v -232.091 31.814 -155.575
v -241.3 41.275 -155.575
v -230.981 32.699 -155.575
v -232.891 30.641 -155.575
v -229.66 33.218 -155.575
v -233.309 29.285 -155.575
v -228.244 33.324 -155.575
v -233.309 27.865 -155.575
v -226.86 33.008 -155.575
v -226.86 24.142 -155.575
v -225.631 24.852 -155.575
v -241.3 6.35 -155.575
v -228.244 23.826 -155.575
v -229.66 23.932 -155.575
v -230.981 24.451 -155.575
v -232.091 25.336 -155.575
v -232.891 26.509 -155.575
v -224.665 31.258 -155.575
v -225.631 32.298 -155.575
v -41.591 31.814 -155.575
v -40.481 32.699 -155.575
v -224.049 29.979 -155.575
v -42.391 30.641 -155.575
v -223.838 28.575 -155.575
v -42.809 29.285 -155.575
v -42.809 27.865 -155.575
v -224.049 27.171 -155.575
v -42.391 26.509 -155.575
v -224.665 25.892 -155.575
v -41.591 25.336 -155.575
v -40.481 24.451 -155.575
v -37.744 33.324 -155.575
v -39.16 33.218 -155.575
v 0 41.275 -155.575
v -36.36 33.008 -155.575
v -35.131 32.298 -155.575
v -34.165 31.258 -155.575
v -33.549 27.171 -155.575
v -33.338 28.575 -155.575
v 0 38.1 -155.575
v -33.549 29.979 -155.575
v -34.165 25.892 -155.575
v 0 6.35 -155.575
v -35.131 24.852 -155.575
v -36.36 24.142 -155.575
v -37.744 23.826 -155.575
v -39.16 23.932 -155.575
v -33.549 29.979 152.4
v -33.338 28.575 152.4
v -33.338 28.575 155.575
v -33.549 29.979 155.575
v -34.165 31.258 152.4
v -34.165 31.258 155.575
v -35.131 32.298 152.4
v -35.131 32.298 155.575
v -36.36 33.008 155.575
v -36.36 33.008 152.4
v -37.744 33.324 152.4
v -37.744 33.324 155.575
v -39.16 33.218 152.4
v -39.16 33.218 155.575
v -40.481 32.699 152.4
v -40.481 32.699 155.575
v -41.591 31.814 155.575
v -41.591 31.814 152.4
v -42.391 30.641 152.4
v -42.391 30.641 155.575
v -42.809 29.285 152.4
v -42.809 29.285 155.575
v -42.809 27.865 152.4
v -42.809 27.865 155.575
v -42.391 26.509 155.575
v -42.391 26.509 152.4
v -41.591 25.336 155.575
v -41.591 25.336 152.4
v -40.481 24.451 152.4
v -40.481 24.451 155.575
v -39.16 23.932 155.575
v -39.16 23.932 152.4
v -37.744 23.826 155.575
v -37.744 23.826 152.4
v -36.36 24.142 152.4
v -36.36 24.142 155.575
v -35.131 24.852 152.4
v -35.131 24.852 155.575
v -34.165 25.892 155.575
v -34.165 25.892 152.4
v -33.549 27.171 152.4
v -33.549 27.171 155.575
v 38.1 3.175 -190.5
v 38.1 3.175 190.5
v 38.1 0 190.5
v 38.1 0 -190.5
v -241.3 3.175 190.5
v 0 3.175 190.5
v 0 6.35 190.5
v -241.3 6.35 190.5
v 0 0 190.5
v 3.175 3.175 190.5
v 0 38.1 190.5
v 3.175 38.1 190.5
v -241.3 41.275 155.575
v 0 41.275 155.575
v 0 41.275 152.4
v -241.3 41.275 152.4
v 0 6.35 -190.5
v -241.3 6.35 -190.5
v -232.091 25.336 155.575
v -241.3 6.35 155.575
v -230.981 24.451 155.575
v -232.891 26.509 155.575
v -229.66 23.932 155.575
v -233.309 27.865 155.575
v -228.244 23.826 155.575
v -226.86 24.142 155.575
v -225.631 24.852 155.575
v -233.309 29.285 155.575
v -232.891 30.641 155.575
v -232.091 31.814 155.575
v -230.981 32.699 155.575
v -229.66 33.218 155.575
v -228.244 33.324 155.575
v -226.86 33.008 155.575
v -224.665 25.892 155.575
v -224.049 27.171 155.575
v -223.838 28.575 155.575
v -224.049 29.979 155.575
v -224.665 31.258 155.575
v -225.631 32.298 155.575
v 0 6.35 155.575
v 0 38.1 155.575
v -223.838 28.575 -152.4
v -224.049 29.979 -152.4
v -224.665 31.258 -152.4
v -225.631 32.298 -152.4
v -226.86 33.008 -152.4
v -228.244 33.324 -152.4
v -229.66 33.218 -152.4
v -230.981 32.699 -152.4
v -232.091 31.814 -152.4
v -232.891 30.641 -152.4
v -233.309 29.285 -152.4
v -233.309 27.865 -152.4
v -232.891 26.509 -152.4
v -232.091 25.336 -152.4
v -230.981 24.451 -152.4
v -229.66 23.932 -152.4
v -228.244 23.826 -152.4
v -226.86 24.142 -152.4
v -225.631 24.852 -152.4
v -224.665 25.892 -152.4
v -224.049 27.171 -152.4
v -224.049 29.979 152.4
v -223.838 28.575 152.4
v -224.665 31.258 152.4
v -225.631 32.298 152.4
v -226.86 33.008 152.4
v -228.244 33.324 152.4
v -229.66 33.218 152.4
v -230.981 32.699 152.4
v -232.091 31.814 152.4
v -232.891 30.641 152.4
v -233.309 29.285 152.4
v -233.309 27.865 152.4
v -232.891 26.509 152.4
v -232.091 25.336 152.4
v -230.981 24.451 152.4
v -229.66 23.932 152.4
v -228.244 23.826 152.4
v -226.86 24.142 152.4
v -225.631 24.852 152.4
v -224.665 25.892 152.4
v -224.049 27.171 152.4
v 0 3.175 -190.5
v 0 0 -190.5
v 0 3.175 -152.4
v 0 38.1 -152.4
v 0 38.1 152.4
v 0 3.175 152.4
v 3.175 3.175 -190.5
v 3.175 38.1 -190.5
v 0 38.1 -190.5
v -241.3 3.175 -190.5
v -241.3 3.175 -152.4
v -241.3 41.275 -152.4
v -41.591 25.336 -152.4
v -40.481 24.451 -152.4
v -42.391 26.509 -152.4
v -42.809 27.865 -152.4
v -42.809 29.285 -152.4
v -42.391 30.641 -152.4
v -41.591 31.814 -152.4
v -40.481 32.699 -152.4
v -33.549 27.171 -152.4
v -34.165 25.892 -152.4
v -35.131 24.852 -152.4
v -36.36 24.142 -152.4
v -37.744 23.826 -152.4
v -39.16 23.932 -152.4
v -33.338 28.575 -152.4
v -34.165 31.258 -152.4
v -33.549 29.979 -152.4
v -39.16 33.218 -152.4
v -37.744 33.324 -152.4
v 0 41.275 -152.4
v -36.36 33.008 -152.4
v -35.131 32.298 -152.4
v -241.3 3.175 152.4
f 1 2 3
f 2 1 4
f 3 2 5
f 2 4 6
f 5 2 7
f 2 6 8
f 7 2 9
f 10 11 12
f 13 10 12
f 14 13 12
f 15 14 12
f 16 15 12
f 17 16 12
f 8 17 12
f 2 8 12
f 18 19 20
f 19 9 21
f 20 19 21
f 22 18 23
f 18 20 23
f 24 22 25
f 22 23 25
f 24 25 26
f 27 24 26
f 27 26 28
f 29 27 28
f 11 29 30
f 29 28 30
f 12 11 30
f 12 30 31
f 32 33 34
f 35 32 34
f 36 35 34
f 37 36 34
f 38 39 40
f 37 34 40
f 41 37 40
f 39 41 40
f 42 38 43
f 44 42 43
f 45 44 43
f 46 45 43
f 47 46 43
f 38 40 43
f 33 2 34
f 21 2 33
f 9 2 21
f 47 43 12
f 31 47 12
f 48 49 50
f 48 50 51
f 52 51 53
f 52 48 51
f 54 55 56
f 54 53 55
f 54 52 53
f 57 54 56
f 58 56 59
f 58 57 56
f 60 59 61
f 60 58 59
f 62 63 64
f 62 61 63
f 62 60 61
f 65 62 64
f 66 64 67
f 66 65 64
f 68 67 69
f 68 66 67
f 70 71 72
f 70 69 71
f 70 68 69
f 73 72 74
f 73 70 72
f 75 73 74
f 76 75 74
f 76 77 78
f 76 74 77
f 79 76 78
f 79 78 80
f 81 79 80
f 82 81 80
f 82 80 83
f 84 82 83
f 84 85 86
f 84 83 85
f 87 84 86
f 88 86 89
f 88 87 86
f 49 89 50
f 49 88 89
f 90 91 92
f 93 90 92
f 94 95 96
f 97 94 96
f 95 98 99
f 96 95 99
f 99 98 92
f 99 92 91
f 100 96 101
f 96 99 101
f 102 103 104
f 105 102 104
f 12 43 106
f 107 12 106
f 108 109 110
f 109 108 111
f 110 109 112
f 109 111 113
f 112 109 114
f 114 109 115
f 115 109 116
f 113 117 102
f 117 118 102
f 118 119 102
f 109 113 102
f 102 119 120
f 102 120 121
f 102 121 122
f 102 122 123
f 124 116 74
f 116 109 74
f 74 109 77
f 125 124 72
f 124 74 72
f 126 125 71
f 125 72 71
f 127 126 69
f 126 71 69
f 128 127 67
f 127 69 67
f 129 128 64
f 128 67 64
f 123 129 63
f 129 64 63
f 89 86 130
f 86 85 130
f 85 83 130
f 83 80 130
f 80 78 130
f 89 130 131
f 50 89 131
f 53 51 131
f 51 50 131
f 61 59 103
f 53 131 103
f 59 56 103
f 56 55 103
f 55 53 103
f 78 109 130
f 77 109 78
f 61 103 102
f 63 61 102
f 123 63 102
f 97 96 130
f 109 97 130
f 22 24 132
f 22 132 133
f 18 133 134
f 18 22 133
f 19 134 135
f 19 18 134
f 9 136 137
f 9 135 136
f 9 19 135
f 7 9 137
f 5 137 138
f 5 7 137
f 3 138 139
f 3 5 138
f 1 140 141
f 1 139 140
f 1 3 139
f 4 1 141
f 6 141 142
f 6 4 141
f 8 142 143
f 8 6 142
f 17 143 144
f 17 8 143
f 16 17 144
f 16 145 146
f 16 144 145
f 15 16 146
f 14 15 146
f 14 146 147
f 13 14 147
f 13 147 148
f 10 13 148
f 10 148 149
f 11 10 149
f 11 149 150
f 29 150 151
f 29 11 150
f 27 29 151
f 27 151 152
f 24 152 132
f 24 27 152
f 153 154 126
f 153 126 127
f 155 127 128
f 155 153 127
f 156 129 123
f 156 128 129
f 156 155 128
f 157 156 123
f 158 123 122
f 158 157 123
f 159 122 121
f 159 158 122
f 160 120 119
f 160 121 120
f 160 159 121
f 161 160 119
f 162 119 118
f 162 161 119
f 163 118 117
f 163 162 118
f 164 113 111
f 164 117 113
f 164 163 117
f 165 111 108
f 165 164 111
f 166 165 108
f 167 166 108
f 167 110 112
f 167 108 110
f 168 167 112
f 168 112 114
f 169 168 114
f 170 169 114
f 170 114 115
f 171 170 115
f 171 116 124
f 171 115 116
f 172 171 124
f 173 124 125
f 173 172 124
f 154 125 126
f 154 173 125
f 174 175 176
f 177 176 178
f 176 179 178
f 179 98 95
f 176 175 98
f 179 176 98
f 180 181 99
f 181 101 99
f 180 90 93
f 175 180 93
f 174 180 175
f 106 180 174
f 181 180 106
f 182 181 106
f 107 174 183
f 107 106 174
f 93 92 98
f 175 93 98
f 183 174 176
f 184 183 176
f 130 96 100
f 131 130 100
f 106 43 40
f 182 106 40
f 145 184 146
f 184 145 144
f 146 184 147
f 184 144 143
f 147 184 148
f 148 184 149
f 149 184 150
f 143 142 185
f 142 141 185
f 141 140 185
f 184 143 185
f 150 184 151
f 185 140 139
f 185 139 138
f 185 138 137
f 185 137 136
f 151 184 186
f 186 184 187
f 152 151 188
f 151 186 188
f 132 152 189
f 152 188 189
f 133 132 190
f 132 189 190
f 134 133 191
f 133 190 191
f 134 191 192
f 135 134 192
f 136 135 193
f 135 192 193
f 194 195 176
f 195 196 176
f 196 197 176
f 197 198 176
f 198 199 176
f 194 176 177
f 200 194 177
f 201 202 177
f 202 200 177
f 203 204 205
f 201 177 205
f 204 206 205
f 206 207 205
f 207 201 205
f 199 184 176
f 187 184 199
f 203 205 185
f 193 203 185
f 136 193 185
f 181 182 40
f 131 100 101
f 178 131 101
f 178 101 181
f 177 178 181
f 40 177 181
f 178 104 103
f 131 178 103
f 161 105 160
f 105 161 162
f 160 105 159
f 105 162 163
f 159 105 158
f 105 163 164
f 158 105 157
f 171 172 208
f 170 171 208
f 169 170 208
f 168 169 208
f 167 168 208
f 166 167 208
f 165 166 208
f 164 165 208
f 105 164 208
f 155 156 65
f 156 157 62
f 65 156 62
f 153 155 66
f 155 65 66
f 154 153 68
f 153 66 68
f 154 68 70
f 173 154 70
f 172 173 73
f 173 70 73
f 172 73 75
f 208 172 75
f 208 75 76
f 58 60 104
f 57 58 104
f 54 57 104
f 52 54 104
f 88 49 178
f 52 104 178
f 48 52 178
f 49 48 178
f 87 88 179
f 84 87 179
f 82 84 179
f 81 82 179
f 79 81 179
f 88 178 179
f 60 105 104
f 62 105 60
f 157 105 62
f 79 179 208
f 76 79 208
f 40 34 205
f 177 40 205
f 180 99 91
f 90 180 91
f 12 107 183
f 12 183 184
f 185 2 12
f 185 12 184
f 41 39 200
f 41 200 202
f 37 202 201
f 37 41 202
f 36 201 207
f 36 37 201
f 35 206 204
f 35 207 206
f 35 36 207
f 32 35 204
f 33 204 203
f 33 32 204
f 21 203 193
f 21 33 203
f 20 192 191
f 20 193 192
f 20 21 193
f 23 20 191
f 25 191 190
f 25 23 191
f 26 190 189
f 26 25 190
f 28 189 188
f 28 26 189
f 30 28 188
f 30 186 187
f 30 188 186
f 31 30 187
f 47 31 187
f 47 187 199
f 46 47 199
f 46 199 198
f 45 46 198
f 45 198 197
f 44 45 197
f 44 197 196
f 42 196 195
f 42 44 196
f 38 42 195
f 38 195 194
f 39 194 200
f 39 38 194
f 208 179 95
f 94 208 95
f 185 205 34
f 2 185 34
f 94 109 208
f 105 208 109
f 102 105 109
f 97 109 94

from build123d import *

# Parameters (mm, degrees)
EXTRUDE_THIN1_DEPTH     = 190.5
EXTRUDE_THIN2_DEPTH     = 241.3
CUT_EXTRUDE3_DEPTH      = 311.192787835
CUT_EXTRUDE3_DEPTH_BACK = 311.192787835
SKETCH5_R               = 4.7625


with BuildPart() as part:
    # Sketch1 → Extrude-Thin1 (new, symmetric)
    with BuildSketch(Plane.XY):
        Polygon((38.1, 0), (0, 0), (0, 38.1), (3.175, 38.1), (3.175, 3.175), (38.1, 3.175), align=None)
    extrude(amount=EXTRUDE_THIN1_DEPTH, both=True)

    # Sketch2 → Extrude-Thin2 (add)
    with BuildSketch(Plane.ZY):
        Polygon((-190.5, 3.175), (-152.4, 3.175), (-152.4, 41.275), (-155.575, 41.275), (-155.575, 6.35), (-190.5, 6.35), align=None)
        Polygon((190.5, 3.175), (152.4, 3.175), (152.4, 41.275), (155.575, 41.275), (155.575, 6.35), (190.5, 6.35), align=None)
    extrude(amount=EXTRUDE_THIN2_DEPTH)

    # Sketch5 → Cut-Extrude3 (cut, two sides: drawn at the far end of the back side and taken through both)
    with BuildSketch(Plane.XY.offset(-CUT_EXTRUDE3_DEPTH_BACK)):
        with Locations((-228.6, 28.575)):
            Circle(SKETCH5_R)
        with Locations((-38.1, 28.575)):
            Circle(SKETCH5_R)
    extrude(amount=CUT_EXTRUDE3_DEPTH + CUT_EXTRUDE3_DEPTH_BACK, mode=Mode.SUBTRACT)


solid = part.part
